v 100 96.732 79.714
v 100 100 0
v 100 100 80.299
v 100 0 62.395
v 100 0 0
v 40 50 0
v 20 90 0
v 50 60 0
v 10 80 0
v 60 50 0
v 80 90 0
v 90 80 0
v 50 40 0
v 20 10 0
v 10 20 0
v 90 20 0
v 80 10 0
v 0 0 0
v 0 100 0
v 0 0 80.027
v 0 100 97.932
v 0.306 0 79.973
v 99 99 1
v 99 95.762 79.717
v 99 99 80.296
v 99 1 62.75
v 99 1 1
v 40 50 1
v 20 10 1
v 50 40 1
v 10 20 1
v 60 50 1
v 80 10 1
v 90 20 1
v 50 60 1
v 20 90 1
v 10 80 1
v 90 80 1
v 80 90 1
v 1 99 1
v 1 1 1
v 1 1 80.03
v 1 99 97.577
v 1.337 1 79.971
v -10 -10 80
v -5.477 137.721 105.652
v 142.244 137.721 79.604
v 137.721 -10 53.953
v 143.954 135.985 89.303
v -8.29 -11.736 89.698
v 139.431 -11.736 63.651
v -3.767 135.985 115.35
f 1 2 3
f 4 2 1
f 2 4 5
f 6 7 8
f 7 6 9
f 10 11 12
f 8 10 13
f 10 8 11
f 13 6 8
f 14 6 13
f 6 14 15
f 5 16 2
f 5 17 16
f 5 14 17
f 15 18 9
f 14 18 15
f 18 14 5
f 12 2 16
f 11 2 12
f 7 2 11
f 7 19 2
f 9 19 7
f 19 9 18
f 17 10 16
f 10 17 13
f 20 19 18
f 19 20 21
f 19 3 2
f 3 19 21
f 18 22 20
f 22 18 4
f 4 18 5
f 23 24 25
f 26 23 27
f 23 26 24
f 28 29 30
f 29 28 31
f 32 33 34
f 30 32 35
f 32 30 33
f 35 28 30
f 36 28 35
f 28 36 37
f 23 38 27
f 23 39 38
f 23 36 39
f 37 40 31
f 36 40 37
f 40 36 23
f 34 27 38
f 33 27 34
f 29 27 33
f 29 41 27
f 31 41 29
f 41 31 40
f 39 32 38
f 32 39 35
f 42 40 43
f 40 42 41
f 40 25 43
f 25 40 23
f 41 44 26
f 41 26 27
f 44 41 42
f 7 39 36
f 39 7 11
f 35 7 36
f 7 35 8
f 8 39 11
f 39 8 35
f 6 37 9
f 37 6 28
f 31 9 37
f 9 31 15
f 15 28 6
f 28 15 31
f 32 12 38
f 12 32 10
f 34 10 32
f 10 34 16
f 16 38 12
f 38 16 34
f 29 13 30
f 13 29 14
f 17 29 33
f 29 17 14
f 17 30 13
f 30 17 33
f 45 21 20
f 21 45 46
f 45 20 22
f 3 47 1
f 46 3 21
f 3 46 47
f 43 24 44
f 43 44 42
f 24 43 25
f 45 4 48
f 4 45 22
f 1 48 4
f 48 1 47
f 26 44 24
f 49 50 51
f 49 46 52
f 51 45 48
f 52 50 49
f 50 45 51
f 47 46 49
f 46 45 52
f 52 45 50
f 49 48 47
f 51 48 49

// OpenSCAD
base_x = 100;
base_y = 100;
base_z = 100;
thickness = 2;
spar_width = 10;

vent_x = base_x / 2 - 2 * thickness;
vent_y = base_y / 2 - 2 * thickness;




module square_vents() {

	translate([thickness,thickness,-5]) {
		cube([vent_x, vent_y, thickness]);
	}

	translate([base_x-thickness-vent_x,thickness,0]) {
		cube([vent_x, vent_y, thickness]);
	}

	translate([thickness,base_y-thickness-vent_y,0]) {
		cube([vent_x, vent_y, thickness]);
	}

	translate([base_x-thickness-vent_x,base_y-thickness-vent_y,0]) {
		cube([vent_x, vent_y, thickness]);
	}
}


module triangle_vents() {
	linear_extrude(height=thickness) {
		polygon(points=[[2*spar_width,spar_width],
						[base_x-2*spar_width,spar_width],
			    			[base_x/2,base_y/2-spar_width]], 
	    			paths=[[0,1,2]]);

		polygon(points=[[spar_width,2*spar_width],
						[spar_width,base_y-2*spar_width],
			    			[base_x/2-spar_width,base_y/2]], 
	    			paths=[[0,1,2]]);

		polygon(points=[[2*spar_width,base_y-spar_width],
						[base_x-2*spar_width,base_y-spar_width],
			    			[base_x/2,base_y/2+spar_width]], 
	    			paths=[[0,1,2]]);

		polygon(points=[[base_x-spar_width,base_y-2*spar_width],
						[base_x-spar_width,2*spar_width],
			    			[base_x/2+spar_width,base_y/2]], 
	    			paths=[[0,1,2]]);



	}
}



difference() {
	difference() {
		cube([base_x,base_y,base_z], center = false);;

		translate([thickness/2,thickness/2,thickness/2]) {
			cube([base_x - thickness, base_y - thickness,base_z - thickness], center=false);
		}

		triangle_vents();
		//square_vents();
	}

	translate([-10,-10,80]) {
		rotate([10,10,0]) {
			cube([150,150,100]);
		}
	}
}

translate([-10,-10,80]) {
	rotate([10,10,0]) {
		cube([150,150,10]);
	}
}
